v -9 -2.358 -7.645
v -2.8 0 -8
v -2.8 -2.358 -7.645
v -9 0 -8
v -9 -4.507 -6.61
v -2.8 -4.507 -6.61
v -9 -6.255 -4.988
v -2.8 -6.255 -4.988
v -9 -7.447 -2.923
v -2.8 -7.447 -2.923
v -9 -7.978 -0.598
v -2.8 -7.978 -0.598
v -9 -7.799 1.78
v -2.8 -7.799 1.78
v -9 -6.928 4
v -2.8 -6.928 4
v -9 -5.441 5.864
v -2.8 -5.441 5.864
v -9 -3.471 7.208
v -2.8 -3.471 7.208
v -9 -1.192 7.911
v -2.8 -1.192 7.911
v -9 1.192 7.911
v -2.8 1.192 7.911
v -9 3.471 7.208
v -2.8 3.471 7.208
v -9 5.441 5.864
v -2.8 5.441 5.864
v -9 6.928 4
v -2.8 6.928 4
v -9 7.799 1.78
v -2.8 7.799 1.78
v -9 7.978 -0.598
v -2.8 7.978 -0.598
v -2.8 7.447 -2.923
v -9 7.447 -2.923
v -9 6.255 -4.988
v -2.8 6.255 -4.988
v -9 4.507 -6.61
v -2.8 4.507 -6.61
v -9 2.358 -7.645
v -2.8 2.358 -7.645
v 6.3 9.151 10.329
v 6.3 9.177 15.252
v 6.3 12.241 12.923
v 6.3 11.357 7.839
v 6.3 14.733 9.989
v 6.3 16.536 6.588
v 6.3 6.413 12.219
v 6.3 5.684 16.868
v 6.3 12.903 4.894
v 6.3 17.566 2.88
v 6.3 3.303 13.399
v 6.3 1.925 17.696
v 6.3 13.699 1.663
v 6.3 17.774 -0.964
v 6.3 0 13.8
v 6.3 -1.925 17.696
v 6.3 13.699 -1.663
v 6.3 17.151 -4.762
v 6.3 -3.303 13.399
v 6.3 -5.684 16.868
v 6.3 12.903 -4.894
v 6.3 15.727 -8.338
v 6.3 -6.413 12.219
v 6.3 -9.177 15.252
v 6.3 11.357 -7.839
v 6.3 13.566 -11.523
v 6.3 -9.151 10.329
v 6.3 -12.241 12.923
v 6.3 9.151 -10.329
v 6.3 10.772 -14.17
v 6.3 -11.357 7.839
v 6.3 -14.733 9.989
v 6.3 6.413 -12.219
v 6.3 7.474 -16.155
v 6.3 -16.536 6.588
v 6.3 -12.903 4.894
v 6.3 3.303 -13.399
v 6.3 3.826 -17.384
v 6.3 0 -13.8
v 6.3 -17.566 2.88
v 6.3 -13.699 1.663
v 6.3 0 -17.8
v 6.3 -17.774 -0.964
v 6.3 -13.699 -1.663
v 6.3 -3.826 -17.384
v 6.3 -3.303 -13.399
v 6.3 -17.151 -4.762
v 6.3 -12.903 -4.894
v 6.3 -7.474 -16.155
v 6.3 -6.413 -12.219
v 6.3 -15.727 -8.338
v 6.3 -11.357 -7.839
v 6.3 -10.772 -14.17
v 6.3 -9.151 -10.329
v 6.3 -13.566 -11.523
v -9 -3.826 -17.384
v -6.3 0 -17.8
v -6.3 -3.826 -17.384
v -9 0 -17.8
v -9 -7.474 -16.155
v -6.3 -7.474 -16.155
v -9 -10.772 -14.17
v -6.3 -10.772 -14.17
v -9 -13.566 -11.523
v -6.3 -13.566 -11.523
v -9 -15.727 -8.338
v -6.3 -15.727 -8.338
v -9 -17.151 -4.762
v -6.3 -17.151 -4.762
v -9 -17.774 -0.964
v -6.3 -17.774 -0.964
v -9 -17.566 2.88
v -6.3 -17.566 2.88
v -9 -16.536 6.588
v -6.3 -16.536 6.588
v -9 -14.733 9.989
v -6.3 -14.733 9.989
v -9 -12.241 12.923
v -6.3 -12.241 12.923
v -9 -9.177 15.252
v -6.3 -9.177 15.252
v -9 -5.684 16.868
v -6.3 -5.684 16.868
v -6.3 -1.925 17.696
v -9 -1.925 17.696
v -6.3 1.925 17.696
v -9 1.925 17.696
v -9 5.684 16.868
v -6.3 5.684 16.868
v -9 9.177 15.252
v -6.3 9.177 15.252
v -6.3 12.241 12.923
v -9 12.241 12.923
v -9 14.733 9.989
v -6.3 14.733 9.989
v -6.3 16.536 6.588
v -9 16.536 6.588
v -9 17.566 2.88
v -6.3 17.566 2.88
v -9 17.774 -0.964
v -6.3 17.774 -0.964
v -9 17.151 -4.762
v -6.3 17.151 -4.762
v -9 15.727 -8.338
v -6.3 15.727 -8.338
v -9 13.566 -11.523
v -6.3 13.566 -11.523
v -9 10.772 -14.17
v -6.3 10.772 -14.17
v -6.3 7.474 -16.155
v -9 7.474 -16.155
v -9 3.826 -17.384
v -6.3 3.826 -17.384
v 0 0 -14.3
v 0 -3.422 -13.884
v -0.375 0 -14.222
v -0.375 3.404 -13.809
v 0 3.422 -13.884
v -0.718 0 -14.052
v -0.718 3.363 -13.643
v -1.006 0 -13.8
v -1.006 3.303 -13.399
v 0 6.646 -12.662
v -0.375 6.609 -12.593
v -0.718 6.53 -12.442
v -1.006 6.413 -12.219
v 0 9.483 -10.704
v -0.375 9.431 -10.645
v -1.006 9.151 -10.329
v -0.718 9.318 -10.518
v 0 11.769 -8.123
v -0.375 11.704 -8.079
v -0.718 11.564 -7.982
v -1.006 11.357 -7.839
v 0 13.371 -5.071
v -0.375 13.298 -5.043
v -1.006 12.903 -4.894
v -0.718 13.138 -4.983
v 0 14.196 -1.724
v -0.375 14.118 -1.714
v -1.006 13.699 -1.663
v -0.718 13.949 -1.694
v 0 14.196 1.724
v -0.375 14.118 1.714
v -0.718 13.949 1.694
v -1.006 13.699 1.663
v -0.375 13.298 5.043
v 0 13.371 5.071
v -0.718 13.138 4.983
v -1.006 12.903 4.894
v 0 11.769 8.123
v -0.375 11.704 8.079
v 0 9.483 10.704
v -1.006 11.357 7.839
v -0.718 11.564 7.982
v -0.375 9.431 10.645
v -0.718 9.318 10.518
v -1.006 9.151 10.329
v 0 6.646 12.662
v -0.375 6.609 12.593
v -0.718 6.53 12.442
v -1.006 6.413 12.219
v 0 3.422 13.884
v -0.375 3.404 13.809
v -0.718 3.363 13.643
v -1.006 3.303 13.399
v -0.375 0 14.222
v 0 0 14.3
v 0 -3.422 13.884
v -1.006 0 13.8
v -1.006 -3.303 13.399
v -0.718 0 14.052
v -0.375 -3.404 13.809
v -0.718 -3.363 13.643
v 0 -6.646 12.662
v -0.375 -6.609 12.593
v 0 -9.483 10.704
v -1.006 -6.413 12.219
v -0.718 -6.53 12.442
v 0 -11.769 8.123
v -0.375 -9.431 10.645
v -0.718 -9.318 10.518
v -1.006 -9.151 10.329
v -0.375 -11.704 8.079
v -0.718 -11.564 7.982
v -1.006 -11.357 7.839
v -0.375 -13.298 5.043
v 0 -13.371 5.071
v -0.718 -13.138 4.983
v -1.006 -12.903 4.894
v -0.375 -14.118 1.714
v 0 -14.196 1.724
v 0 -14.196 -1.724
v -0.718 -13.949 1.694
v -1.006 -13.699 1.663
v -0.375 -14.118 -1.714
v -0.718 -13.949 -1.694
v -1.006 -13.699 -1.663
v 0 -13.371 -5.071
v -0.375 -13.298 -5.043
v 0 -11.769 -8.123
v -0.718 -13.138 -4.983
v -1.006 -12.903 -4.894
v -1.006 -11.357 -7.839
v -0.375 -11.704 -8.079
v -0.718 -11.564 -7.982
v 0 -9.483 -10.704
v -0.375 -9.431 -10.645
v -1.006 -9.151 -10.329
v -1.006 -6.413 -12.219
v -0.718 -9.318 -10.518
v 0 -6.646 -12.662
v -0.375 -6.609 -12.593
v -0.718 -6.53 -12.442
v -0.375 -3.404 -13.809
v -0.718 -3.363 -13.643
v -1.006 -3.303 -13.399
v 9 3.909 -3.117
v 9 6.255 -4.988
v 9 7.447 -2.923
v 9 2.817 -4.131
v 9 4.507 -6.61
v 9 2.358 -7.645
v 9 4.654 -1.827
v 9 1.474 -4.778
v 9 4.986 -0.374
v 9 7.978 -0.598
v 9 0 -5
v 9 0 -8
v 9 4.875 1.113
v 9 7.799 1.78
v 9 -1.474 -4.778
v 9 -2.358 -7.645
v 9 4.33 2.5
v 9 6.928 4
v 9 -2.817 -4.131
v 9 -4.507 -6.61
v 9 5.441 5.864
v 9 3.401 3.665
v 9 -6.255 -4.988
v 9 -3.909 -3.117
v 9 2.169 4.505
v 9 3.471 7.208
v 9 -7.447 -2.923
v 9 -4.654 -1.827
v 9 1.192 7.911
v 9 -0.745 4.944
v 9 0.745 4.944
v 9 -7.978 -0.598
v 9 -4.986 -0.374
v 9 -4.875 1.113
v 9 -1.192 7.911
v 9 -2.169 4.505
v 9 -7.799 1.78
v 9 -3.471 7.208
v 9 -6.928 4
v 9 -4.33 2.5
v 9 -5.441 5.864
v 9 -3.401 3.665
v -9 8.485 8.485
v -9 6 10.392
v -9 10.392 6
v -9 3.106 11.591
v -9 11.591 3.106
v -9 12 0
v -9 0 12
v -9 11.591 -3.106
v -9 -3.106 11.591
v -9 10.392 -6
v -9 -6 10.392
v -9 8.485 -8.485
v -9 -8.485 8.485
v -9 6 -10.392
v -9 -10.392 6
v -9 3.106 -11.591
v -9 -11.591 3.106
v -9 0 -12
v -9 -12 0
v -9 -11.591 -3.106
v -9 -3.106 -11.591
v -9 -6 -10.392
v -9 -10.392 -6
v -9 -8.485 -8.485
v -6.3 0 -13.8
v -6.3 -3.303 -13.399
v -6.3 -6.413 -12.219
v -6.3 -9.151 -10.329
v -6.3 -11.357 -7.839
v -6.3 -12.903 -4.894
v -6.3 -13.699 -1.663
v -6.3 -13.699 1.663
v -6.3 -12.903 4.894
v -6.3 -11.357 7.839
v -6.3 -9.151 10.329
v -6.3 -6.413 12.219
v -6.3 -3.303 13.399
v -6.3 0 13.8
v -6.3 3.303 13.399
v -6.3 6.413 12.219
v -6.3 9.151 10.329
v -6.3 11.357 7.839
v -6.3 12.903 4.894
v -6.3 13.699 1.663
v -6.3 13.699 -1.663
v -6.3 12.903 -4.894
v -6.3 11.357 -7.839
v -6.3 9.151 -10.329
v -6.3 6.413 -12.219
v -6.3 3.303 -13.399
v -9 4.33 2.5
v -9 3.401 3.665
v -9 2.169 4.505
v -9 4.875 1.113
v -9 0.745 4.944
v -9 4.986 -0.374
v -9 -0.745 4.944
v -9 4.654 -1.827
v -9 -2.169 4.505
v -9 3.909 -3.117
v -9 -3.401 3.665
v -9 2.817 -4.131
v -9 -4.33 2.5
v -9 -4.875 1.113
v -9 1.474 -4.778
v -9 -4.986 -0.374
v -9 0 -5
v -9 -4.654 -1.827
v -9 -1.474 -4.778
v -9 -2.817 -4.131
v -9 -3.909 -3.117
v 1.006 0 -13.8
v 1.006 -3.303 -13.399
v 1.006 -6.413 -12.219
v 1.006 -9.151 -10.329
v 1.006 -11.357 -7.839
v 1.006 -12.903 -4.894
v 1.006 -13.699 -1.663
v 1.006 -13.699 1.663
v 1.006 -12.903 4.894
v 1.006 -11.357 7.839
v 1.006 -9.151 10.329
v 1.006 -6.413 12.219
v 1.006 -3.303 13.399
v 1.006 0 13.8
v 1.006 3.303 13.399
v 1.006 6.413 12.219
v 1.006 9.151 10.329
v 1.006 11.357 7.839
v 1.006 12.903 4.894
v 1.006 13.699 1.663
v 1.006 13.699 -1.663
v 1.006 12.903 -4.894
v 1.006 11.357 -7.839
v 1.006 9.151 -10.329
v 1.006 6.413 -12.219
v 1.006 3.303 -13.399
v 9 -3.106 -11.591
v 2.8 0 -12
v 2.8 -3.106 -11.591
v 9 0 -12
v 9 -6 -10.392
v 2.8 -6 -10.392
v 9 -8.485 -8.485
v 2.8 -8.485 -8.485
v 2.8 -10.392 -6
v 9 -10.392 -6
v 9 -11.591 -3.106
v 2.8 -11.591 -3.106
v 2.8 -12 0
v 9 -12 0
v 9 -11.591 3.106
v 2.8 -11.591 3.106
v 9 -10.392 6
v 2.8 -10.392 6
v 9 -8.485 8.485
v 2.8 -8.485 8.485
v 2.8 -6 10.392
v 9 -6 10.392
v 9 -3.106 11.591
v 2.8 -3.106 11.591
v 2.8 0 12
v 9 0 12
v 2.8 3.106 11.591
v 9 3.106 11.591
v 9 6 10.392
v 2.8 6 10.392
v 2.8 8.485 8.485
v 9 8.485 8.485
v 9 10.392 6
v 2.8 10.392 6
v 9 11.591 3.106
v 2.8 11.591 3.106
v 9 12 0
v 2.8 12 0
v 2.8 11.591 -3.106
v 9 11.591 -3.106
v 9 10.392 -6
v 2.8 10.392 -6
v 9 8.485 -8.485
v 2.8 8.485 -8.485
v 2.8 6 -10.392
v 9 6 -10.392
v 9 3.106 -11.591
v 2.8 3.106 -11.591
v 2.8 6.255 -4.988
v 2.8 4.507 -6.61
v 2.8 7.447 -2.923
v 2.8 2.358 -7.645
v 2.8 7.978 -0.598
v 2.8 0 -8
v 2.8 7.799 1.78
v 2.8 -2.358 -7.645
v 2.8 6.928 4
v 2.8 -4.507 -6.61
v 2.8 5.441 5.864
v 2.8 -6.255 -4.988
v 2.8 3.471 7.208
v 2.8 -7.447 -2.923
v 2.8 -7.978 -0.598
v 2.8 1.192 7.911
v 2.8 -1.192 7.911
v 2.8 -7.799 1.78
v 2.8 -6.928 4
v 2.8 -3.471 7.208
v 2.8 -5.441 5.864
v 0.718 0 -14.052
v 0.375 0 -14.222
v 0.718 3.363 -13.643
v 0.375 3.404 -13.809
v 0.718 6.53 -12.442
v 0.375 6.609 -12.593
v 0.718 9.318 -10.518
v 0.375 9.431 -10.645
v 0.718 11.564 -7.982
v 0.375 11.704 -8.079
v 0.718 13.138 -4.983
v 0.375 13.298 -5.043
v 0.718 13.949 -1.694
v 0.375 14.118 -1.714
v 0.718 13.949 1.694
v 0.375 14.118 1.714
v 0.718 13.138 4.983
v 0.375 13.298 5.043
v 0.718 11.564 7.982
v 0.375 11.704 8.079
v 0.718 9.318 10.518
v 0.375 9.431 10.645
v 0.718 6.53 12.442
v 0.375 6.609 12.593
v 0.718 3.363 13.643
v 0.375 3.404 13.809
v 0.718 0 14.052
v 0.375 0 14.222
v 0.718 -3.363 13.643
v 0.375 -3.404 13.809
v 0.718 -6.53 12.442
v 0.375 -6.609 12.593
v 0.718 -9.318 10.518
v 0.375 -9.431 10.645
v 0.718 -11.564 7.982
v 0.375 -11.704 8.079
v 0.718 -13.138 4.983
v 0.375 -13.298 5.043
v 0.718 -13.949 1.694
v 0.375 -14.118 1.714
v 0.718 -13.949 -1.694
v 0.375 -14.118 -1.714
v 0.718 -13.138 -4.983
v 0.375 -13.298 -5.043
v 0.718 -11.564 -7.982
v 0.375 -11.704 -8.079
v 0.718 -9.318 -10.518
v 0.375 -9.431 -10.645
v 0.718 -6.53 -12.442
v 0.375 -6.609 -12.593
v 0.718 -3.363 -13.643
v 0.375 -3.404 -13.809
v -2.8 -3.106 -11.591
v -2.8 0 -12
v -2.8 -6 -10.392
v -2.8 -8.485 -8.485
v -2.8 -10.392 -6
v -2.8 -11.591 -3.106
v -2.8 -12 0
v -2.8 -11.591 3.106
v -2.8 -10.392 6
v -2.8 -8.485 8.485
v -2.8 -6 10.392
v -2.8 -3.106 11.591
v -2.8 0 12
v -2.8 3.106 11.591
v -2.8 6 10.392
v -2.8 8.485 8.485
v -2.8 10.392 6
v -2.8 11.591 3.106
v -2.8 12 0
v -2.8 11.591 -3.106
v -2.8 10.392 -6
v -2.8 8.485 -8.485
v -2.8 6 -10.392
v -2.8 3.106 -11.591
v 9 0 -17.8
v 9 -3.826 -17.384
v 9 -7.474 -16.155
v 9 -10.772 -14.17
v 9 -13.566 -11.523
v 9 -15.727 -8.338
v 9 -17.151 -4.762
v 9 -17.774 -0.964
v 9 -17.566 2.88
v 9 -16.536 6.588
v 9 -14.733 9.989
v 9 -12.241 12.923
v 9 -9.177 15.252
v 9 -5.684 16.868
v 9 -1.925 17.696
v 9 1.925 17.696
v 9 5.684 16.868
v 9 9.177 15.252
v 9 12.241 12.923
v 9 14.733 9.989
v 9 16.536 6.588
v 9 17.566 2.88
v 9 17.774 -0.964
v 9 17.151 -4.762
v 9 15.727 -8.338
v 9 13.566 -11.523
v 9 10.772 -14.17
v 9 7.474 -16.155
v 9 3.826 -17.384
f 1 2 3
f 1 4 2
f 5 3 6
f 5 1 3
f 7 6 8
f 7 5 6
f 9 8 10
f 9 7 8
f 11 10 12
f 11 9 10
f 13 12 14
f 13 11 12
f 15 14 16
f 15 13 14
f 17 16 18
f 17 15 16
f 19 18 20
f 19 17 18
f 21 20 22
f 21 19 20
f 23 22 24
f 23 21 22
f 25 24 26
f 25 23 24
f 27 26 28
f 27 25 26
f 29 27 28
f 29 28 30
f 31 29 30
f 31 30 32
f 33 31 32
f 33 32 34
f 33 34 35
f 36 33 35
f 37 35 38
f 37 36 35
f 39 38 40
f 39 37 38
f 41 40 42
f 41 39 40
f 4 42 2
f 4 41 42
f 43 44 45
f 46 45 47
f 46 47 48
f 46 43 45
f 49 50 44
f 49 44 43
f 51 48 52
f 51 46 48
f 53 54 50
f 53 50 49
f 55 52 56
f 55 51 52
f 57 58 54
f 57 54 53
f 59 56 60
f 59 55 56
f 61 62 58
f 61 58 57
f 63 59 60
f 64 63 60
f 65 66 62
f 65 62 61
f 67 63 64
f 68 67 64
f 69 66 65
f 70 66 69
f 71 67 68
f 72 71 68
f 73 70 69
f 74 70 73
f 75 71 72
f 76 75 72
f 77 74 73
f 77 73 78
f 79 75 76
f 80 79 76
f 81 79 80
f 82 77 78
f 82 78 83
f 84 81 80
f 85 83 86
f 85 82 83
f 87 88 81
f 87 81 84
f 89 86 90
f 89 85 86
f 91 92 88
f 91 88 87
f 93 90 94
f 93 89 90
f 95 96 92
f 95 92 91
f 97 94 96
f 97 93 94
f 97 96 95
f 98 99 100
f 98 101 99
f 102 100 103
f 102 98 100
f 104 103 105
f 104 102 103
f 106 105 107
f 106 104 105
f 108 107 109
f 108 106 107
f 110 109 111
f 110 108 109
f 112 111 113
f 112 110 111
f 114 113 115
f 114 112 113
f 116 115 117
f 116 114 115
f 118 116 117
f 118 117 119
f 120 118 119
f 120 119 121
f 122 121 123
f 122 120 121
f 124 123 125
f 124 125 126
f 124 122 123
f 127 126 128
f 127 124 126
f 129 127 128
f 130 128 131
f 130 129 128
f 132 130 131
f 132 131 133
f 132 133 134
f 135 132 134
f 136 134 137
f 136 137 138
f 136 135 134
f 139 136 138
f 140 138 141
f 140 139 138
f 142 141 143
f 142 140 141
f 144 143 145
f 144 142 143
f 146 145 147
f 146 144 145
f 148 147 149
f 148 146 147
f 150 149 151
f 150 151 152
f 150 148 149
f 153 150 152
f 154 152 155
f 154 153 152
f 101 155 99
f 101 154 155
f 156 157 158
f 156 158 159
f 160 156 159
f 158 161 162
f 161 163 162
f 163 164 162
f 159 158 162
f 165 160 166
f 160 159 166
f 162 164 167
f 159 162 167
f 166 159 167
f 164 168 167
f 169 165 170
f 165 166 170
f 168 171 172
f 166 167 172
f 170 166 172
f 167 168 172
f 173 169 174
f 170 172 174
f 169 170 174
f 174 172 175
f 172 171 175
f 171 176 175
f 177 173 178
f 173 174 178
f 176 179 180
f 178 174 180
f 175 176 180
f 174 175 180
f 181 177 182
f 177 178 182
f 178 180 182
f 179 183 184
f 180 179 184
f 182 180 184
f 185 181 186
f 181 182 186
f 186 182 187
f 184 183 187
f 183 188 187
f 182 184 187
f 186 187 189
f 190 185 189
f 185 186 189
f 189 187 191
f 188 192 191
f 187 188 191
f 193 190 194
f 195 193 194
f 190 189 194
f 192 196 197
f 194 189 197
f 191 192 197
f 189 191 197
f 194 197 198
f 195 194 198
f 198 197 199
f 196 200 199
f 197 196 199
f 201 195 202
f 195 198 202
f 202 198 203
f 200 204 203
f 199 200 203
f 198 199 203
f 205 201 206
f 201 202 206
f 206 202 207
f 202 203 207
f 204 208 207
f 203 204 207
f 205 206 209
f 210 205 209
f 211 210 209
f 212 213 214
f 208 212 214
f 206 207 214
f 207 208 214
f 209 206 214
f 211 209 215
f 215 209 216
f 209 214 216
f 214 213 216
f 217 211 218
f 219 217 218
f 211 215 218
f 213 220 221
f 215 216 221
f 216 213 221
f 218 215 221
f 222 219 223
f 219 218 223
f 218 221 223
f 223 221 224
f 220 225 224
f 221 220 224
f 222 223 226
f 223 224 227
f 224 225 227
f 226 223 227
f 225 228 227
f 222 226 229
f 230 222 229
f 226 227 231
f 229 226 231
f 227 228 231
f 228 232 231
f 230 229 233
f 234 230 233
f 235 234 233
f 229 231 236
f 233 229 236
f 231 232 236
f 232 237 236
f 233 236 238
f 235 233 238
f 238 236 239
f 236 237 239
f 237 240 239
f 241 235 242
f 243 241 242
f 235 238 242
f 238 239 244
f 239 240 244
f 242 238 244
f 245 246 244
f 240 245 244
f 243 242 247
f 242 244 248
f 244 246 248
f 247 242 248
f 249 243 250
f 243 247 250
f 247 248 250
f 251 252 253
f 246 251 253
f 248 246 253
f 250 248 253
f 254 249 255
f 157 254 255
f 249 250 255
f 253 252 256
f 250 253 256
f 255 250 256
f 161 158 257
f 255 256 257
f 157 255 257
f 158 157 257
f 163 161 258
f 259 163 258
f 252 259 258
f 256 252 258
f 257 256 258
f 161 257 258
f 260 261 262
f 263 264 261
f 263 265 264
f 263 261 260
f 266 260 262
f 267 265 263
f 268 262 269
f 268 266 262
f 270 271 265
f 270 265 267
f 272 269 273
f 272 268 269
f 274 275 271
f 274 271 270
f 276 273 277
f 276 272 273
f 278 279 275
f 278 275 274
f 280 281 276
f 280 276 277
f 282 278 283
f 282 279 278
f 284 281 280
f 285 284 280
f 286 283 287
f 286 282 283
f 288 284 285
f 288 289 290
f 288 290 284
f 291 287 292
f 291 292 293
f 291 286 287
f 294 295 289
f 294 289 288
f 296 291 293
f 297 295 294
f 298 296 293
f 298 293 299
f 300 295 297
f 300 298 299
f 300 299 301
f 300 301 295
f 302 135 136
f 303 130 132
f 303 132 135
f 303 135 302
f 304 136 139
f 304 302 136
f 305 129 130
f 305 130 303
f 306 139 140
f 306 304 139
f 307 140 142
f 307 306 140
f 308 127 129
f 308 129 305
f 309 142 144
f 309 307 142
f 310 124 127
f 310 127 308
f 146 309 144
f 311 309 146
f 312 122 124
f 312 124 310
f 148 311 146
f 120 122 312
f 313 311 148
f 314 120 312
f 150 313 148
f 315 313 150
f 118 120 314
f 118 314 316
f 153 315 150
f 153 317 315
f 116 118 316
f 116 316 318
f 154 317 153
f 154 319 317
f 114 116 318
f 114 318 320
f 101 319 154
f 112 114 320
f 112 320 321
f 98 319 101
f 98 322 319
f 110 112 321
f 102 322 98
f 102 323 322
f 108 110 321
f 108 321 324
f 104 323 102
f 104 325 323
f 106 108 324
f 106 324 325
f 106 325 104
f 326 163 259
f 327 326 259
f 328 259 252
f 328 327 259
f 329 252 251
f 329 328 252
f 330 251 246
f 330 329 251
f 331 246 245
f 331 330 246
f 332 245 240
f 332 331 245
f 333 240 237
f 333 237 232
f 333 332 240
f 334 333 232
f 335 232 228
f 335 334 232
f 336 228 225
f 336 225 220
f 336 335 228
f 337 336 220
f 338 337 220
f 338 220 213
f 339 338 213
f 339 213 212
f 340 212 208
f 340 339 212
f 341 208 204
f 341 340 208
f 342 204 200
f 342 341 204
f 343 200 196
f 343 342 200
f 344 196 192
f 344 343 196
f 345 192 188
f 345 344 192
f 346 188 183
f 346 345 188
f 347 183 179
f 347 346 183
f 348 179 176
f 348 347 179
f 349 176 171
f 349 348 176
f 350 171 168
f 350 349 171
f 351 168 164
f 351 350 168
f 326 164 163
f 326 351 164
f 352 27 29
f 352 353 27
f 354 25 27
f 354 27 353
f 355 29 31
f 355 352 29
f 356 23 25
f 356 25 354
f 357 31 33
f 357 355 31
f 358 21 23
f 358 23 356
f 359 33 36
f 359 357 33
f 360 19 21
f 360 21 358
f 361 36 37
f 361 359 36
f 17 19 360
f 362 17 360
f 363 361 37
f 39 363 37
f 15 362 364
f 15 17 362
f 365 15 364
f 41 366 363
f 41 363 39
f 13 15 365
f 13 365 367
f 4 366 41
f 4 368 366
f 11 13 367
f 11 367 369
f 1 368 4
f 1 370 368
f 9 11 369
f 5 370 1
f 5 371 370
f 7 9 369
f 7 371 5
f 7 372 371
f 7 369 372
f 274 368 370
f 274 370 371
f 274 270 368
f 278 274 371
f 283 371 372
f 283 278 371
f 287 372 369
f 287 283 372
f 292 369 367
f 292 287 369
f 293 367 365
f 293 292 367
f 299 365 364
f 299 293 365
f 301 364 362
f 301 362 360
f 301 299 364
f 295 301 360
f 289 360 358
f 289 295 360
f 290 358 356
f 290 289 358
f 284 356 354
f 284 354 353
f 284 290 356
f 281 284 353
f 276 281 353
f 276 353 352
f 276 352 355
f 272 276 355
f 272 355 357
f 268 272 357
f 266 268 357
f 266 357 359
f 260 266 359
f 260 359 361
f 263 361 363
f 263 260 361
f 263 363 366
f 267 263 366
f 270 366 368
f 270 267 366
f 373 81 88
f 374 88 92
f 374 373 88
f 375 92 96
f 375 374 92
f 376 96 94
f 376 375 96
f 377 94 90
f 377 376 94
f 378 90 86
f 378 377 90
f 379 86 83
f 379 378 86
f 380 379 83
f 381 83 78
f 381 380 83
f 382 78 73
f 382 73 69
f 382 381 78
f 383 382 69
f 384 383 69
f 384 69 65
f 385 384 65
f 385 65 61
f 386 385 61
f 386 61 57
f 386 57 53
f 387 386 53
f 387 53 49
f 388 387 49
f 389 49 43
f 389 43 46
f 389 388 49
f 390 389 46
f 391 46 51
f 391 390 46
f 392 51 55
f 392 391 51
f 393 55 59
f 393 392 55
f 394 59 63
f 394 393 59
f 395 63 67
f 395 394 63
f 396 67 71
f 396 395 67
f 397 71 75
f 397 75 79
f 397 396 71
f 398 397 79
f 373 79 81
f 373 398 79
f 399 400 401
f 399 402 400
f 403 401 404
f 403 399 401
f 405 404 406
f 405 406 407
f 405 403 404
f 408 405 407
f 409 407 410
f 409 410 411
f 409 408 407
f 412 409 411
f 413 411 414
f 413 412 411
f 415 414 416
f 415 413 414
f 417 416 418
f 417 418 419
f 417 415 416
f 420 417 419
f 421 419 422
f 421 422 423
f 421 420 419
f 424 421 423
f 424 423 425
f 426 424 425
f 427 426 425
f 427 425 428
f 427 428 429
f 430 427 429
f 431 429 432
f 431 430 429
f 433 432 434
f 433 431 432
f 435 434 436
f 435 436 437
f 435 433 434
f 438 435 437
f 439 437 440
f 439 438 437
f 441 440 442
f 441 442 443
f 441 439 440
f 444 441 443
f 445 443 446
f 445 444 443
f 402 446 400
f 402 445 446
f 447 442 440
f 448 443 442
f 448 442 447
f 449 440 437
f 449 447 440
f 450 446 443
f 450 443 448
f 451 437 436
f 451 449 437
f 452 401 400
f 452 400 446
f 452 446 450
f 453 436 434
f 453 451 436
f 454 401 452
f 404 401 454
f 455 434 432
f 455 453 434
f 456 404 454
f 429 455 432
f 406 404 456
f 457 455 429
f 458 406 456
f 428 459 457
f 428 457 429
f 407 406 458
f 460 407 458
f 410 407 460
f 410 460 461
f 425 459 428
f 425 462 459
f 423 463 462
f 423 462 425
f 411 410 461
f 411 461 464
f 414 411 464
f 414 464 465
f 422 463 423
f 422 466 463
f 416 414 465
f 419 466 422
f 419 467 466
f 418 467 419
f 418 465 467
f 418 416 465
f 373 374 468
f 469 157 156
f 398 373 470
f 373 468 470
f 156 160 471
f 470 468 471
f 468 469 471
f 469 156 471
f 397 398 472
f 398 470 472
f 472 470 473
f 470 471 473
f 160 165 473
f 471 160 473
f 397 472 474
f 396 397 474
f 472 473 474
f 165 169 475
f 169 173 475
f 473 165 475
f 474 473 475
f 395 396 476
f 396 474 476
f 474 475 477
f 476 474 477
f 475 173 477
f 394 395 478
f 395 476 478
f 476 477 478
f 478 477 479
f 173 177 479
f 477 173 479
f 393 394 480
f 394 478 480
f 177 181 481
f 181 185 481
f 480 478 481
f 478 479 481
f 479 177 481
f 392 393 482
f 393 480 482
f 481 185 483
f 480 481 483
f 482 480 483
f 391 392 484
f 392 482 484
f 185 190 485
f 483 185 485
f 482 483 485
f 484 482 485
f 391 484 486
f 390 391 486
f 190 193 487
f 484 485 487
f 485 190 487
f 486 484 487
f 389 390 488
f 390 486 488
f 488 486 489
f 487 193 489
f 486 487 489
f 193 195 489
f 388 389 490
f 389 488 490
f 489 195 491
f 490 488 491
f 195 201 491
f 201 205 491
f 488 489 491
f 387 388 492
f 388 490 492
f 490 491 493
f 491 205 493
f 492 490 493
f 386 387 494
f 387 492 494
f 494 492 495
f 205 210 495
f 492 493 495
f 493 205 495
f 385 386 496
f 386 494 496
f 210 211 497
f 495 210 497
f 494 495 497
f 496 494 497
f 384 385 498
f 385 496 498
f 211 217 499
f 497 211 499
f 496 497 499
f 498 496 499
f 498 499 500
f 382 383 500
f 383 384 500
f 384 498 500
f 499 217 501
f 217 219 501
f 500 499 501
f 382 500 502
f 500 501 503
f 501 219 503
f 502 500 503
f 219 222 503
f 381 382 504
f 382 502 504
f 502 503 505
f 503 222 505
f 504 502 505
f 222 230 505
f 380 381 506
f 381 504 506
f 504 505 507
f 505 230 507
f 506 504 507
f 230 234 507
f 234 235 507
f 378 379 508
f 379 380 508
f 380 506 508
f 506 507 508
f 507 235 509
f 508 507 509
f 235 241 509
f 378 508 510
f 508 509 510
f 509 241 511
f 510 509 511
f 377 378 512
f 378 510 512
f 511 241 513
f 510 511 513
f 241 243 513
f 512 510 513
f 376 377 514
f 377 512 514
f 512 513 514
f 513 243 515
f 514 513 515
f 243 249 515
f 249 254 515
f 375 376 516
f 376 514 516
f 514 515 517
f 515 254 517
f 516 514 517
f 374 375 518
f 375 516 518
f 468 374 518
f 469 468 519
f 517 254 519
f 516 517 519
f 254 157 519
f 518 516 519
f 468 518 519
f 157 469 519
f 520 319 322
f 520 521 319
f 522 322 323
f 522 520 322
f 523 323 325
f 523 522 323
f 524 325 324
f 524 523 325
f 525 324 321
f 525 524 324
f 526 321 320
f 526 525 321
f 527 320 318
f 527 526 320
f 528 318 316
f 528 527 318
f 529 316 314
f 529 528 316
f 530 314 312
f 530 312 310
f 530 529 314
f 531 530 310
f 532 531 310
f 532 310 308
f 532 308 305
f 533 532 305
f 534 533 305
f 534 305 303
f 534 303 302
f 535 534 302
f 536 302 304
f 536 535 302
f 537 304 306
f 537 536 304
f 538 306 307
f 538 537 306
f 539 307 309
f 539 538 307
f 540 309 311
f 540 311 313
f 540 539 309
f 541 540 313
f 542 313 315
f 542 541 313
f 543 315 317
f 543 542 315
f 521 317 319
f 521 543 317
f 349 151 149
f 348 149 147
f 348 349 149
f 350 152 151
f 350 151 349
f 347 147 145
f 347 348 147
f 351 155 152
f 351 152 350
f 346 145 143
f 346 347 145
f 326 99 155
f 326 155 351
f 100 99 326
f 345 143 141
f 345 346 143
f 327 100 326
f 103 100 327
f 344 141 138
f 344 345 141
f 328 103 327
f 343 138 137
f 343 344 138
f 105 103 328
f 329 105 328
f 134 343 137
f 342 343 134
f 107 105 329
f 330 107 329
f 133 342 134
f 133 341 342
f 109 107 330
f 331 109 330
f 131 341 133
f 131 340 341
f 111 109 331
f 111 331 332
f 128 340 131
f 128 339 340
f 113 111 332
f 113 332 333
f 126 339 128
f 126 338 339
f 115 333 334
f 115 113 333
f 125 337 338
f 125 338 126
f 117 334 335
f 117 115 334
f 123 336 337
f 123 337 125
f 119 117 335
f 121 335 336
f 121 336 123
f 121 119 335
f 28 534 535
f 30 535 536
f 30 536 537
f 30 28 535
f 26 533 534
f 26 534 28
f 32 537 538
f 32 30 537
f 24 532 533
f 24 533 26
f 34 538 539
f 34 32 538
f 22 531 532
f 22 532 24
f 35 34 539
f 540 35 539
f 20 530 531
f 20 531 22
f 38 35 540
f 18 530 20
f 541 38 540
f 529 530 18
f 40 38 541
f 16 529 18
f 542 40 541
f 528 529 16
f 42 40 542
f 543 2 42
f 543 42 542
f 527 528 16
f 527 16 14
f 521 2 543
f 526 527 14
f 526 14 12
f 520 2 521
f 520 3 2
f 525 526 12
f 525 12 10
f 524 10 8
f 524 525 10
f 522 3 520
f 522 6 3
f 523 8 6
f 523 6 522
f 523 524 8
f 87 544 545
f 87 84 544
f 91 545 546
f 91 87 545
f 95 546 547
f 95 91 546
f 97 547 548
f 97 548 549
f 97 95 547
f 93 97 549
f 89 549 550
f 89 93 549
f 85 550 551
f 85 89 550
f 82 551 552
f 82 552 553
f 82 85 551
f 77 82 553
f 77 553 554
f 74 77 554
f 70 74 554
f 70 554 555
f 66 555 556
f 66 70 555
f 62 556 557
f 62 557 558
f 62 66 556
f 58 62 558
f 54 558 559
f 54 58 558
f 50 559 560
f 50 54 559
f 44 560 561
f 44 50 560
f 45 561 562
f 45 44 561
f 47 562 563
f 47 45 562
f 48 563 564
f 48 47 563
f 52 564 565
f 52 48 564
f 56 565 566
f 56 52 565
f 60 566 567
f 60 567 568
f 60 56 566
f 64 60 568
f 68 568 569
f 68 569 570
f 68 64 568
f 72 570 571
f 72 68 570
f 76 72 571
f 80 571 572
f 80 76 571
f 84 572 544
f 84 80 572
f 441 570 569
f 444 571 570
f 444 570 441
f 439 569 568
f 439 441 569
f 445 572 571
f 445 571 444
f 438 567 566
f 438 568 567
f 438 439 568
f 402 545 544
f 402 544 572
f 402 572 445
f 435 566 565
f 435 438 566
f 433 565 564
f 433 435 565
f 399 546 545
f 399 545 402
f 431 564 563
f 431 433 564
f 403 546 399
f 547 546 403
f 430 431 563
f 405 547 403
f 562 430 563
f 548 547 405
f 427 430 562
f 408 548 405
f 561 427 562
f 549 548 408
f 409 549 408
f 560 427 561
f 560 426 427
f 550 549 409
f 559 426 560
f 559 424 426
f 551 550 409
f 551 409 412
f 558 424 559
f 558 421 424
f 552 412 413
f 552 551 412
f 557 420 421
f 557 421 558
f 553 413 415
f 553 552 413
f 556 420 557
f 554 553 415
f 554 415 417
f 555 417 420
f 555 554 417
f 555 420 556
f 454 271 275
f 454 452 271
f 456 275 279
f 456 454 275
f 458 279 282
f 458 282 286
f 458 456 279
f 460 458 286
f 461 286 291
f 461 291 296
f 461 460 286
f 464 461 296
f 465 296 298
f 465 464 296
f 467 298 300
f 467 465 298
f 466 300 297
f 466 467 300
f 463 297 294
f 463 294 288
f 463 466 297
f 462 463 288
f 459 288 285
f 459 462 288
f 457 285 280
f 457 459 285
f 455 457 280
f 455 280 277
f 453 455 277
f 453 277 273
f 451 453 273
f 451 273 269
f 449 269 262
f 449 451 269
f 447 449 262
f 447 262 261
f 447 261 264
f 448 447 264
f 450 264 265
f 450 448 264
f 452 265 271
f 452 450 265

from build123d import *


with BuildPart() as part:
    # Эскиз1 → Повернуть1 (revolve)
    with BuildSketch(Plane.XY, mode=Mode.PRIVATE) as revolve_1_sk:
        Polygon((-9, 5), (9, 5), (9, 8), (2.8, 8), (2.8, 12), (9, 12), (9, 17.8), (6.3, 17.8), (6.3, 13.8), (1.3, 13.8), (-1.3, 13.8), (-6.3, 13.8), (-6.3, 17.8), (-9, 17.8), (-9, 12), (-2.8, 12), (-2.8, 8), (-9, 8), align=None)
    revolve(revolve_1_sk.sketch.rotate(Axis((0, 0, 0), (-1, 0, 0)), 90), axis=Axis((0, 0, 0), (-1, 0, 0)))

    # Эскиз2 → Повернуть2 (revolve)
    with BuildSketch(Plane.XY, mode=Mode.PRIVATE) as revolve_2_sk:
        with BuildLine():
            Line((-1.3, 13.3), (1.3, 13.3))
            ThreePointArc((1.3, 13.3), (0.798778164, 13.993411613), (0, 14.3))
            ThreePointArc((0, 14.3), (-0.798778164, 13.993411613), (-1.3, 13.3))
        make_face()
    revolve(revolve_2_sk.sketch.rotate(Axis((0, 0, 0), (1, 0, 0)), 270), axis=Axis((0, 0, 0), (1, 0, 0)))


solid = part.part
